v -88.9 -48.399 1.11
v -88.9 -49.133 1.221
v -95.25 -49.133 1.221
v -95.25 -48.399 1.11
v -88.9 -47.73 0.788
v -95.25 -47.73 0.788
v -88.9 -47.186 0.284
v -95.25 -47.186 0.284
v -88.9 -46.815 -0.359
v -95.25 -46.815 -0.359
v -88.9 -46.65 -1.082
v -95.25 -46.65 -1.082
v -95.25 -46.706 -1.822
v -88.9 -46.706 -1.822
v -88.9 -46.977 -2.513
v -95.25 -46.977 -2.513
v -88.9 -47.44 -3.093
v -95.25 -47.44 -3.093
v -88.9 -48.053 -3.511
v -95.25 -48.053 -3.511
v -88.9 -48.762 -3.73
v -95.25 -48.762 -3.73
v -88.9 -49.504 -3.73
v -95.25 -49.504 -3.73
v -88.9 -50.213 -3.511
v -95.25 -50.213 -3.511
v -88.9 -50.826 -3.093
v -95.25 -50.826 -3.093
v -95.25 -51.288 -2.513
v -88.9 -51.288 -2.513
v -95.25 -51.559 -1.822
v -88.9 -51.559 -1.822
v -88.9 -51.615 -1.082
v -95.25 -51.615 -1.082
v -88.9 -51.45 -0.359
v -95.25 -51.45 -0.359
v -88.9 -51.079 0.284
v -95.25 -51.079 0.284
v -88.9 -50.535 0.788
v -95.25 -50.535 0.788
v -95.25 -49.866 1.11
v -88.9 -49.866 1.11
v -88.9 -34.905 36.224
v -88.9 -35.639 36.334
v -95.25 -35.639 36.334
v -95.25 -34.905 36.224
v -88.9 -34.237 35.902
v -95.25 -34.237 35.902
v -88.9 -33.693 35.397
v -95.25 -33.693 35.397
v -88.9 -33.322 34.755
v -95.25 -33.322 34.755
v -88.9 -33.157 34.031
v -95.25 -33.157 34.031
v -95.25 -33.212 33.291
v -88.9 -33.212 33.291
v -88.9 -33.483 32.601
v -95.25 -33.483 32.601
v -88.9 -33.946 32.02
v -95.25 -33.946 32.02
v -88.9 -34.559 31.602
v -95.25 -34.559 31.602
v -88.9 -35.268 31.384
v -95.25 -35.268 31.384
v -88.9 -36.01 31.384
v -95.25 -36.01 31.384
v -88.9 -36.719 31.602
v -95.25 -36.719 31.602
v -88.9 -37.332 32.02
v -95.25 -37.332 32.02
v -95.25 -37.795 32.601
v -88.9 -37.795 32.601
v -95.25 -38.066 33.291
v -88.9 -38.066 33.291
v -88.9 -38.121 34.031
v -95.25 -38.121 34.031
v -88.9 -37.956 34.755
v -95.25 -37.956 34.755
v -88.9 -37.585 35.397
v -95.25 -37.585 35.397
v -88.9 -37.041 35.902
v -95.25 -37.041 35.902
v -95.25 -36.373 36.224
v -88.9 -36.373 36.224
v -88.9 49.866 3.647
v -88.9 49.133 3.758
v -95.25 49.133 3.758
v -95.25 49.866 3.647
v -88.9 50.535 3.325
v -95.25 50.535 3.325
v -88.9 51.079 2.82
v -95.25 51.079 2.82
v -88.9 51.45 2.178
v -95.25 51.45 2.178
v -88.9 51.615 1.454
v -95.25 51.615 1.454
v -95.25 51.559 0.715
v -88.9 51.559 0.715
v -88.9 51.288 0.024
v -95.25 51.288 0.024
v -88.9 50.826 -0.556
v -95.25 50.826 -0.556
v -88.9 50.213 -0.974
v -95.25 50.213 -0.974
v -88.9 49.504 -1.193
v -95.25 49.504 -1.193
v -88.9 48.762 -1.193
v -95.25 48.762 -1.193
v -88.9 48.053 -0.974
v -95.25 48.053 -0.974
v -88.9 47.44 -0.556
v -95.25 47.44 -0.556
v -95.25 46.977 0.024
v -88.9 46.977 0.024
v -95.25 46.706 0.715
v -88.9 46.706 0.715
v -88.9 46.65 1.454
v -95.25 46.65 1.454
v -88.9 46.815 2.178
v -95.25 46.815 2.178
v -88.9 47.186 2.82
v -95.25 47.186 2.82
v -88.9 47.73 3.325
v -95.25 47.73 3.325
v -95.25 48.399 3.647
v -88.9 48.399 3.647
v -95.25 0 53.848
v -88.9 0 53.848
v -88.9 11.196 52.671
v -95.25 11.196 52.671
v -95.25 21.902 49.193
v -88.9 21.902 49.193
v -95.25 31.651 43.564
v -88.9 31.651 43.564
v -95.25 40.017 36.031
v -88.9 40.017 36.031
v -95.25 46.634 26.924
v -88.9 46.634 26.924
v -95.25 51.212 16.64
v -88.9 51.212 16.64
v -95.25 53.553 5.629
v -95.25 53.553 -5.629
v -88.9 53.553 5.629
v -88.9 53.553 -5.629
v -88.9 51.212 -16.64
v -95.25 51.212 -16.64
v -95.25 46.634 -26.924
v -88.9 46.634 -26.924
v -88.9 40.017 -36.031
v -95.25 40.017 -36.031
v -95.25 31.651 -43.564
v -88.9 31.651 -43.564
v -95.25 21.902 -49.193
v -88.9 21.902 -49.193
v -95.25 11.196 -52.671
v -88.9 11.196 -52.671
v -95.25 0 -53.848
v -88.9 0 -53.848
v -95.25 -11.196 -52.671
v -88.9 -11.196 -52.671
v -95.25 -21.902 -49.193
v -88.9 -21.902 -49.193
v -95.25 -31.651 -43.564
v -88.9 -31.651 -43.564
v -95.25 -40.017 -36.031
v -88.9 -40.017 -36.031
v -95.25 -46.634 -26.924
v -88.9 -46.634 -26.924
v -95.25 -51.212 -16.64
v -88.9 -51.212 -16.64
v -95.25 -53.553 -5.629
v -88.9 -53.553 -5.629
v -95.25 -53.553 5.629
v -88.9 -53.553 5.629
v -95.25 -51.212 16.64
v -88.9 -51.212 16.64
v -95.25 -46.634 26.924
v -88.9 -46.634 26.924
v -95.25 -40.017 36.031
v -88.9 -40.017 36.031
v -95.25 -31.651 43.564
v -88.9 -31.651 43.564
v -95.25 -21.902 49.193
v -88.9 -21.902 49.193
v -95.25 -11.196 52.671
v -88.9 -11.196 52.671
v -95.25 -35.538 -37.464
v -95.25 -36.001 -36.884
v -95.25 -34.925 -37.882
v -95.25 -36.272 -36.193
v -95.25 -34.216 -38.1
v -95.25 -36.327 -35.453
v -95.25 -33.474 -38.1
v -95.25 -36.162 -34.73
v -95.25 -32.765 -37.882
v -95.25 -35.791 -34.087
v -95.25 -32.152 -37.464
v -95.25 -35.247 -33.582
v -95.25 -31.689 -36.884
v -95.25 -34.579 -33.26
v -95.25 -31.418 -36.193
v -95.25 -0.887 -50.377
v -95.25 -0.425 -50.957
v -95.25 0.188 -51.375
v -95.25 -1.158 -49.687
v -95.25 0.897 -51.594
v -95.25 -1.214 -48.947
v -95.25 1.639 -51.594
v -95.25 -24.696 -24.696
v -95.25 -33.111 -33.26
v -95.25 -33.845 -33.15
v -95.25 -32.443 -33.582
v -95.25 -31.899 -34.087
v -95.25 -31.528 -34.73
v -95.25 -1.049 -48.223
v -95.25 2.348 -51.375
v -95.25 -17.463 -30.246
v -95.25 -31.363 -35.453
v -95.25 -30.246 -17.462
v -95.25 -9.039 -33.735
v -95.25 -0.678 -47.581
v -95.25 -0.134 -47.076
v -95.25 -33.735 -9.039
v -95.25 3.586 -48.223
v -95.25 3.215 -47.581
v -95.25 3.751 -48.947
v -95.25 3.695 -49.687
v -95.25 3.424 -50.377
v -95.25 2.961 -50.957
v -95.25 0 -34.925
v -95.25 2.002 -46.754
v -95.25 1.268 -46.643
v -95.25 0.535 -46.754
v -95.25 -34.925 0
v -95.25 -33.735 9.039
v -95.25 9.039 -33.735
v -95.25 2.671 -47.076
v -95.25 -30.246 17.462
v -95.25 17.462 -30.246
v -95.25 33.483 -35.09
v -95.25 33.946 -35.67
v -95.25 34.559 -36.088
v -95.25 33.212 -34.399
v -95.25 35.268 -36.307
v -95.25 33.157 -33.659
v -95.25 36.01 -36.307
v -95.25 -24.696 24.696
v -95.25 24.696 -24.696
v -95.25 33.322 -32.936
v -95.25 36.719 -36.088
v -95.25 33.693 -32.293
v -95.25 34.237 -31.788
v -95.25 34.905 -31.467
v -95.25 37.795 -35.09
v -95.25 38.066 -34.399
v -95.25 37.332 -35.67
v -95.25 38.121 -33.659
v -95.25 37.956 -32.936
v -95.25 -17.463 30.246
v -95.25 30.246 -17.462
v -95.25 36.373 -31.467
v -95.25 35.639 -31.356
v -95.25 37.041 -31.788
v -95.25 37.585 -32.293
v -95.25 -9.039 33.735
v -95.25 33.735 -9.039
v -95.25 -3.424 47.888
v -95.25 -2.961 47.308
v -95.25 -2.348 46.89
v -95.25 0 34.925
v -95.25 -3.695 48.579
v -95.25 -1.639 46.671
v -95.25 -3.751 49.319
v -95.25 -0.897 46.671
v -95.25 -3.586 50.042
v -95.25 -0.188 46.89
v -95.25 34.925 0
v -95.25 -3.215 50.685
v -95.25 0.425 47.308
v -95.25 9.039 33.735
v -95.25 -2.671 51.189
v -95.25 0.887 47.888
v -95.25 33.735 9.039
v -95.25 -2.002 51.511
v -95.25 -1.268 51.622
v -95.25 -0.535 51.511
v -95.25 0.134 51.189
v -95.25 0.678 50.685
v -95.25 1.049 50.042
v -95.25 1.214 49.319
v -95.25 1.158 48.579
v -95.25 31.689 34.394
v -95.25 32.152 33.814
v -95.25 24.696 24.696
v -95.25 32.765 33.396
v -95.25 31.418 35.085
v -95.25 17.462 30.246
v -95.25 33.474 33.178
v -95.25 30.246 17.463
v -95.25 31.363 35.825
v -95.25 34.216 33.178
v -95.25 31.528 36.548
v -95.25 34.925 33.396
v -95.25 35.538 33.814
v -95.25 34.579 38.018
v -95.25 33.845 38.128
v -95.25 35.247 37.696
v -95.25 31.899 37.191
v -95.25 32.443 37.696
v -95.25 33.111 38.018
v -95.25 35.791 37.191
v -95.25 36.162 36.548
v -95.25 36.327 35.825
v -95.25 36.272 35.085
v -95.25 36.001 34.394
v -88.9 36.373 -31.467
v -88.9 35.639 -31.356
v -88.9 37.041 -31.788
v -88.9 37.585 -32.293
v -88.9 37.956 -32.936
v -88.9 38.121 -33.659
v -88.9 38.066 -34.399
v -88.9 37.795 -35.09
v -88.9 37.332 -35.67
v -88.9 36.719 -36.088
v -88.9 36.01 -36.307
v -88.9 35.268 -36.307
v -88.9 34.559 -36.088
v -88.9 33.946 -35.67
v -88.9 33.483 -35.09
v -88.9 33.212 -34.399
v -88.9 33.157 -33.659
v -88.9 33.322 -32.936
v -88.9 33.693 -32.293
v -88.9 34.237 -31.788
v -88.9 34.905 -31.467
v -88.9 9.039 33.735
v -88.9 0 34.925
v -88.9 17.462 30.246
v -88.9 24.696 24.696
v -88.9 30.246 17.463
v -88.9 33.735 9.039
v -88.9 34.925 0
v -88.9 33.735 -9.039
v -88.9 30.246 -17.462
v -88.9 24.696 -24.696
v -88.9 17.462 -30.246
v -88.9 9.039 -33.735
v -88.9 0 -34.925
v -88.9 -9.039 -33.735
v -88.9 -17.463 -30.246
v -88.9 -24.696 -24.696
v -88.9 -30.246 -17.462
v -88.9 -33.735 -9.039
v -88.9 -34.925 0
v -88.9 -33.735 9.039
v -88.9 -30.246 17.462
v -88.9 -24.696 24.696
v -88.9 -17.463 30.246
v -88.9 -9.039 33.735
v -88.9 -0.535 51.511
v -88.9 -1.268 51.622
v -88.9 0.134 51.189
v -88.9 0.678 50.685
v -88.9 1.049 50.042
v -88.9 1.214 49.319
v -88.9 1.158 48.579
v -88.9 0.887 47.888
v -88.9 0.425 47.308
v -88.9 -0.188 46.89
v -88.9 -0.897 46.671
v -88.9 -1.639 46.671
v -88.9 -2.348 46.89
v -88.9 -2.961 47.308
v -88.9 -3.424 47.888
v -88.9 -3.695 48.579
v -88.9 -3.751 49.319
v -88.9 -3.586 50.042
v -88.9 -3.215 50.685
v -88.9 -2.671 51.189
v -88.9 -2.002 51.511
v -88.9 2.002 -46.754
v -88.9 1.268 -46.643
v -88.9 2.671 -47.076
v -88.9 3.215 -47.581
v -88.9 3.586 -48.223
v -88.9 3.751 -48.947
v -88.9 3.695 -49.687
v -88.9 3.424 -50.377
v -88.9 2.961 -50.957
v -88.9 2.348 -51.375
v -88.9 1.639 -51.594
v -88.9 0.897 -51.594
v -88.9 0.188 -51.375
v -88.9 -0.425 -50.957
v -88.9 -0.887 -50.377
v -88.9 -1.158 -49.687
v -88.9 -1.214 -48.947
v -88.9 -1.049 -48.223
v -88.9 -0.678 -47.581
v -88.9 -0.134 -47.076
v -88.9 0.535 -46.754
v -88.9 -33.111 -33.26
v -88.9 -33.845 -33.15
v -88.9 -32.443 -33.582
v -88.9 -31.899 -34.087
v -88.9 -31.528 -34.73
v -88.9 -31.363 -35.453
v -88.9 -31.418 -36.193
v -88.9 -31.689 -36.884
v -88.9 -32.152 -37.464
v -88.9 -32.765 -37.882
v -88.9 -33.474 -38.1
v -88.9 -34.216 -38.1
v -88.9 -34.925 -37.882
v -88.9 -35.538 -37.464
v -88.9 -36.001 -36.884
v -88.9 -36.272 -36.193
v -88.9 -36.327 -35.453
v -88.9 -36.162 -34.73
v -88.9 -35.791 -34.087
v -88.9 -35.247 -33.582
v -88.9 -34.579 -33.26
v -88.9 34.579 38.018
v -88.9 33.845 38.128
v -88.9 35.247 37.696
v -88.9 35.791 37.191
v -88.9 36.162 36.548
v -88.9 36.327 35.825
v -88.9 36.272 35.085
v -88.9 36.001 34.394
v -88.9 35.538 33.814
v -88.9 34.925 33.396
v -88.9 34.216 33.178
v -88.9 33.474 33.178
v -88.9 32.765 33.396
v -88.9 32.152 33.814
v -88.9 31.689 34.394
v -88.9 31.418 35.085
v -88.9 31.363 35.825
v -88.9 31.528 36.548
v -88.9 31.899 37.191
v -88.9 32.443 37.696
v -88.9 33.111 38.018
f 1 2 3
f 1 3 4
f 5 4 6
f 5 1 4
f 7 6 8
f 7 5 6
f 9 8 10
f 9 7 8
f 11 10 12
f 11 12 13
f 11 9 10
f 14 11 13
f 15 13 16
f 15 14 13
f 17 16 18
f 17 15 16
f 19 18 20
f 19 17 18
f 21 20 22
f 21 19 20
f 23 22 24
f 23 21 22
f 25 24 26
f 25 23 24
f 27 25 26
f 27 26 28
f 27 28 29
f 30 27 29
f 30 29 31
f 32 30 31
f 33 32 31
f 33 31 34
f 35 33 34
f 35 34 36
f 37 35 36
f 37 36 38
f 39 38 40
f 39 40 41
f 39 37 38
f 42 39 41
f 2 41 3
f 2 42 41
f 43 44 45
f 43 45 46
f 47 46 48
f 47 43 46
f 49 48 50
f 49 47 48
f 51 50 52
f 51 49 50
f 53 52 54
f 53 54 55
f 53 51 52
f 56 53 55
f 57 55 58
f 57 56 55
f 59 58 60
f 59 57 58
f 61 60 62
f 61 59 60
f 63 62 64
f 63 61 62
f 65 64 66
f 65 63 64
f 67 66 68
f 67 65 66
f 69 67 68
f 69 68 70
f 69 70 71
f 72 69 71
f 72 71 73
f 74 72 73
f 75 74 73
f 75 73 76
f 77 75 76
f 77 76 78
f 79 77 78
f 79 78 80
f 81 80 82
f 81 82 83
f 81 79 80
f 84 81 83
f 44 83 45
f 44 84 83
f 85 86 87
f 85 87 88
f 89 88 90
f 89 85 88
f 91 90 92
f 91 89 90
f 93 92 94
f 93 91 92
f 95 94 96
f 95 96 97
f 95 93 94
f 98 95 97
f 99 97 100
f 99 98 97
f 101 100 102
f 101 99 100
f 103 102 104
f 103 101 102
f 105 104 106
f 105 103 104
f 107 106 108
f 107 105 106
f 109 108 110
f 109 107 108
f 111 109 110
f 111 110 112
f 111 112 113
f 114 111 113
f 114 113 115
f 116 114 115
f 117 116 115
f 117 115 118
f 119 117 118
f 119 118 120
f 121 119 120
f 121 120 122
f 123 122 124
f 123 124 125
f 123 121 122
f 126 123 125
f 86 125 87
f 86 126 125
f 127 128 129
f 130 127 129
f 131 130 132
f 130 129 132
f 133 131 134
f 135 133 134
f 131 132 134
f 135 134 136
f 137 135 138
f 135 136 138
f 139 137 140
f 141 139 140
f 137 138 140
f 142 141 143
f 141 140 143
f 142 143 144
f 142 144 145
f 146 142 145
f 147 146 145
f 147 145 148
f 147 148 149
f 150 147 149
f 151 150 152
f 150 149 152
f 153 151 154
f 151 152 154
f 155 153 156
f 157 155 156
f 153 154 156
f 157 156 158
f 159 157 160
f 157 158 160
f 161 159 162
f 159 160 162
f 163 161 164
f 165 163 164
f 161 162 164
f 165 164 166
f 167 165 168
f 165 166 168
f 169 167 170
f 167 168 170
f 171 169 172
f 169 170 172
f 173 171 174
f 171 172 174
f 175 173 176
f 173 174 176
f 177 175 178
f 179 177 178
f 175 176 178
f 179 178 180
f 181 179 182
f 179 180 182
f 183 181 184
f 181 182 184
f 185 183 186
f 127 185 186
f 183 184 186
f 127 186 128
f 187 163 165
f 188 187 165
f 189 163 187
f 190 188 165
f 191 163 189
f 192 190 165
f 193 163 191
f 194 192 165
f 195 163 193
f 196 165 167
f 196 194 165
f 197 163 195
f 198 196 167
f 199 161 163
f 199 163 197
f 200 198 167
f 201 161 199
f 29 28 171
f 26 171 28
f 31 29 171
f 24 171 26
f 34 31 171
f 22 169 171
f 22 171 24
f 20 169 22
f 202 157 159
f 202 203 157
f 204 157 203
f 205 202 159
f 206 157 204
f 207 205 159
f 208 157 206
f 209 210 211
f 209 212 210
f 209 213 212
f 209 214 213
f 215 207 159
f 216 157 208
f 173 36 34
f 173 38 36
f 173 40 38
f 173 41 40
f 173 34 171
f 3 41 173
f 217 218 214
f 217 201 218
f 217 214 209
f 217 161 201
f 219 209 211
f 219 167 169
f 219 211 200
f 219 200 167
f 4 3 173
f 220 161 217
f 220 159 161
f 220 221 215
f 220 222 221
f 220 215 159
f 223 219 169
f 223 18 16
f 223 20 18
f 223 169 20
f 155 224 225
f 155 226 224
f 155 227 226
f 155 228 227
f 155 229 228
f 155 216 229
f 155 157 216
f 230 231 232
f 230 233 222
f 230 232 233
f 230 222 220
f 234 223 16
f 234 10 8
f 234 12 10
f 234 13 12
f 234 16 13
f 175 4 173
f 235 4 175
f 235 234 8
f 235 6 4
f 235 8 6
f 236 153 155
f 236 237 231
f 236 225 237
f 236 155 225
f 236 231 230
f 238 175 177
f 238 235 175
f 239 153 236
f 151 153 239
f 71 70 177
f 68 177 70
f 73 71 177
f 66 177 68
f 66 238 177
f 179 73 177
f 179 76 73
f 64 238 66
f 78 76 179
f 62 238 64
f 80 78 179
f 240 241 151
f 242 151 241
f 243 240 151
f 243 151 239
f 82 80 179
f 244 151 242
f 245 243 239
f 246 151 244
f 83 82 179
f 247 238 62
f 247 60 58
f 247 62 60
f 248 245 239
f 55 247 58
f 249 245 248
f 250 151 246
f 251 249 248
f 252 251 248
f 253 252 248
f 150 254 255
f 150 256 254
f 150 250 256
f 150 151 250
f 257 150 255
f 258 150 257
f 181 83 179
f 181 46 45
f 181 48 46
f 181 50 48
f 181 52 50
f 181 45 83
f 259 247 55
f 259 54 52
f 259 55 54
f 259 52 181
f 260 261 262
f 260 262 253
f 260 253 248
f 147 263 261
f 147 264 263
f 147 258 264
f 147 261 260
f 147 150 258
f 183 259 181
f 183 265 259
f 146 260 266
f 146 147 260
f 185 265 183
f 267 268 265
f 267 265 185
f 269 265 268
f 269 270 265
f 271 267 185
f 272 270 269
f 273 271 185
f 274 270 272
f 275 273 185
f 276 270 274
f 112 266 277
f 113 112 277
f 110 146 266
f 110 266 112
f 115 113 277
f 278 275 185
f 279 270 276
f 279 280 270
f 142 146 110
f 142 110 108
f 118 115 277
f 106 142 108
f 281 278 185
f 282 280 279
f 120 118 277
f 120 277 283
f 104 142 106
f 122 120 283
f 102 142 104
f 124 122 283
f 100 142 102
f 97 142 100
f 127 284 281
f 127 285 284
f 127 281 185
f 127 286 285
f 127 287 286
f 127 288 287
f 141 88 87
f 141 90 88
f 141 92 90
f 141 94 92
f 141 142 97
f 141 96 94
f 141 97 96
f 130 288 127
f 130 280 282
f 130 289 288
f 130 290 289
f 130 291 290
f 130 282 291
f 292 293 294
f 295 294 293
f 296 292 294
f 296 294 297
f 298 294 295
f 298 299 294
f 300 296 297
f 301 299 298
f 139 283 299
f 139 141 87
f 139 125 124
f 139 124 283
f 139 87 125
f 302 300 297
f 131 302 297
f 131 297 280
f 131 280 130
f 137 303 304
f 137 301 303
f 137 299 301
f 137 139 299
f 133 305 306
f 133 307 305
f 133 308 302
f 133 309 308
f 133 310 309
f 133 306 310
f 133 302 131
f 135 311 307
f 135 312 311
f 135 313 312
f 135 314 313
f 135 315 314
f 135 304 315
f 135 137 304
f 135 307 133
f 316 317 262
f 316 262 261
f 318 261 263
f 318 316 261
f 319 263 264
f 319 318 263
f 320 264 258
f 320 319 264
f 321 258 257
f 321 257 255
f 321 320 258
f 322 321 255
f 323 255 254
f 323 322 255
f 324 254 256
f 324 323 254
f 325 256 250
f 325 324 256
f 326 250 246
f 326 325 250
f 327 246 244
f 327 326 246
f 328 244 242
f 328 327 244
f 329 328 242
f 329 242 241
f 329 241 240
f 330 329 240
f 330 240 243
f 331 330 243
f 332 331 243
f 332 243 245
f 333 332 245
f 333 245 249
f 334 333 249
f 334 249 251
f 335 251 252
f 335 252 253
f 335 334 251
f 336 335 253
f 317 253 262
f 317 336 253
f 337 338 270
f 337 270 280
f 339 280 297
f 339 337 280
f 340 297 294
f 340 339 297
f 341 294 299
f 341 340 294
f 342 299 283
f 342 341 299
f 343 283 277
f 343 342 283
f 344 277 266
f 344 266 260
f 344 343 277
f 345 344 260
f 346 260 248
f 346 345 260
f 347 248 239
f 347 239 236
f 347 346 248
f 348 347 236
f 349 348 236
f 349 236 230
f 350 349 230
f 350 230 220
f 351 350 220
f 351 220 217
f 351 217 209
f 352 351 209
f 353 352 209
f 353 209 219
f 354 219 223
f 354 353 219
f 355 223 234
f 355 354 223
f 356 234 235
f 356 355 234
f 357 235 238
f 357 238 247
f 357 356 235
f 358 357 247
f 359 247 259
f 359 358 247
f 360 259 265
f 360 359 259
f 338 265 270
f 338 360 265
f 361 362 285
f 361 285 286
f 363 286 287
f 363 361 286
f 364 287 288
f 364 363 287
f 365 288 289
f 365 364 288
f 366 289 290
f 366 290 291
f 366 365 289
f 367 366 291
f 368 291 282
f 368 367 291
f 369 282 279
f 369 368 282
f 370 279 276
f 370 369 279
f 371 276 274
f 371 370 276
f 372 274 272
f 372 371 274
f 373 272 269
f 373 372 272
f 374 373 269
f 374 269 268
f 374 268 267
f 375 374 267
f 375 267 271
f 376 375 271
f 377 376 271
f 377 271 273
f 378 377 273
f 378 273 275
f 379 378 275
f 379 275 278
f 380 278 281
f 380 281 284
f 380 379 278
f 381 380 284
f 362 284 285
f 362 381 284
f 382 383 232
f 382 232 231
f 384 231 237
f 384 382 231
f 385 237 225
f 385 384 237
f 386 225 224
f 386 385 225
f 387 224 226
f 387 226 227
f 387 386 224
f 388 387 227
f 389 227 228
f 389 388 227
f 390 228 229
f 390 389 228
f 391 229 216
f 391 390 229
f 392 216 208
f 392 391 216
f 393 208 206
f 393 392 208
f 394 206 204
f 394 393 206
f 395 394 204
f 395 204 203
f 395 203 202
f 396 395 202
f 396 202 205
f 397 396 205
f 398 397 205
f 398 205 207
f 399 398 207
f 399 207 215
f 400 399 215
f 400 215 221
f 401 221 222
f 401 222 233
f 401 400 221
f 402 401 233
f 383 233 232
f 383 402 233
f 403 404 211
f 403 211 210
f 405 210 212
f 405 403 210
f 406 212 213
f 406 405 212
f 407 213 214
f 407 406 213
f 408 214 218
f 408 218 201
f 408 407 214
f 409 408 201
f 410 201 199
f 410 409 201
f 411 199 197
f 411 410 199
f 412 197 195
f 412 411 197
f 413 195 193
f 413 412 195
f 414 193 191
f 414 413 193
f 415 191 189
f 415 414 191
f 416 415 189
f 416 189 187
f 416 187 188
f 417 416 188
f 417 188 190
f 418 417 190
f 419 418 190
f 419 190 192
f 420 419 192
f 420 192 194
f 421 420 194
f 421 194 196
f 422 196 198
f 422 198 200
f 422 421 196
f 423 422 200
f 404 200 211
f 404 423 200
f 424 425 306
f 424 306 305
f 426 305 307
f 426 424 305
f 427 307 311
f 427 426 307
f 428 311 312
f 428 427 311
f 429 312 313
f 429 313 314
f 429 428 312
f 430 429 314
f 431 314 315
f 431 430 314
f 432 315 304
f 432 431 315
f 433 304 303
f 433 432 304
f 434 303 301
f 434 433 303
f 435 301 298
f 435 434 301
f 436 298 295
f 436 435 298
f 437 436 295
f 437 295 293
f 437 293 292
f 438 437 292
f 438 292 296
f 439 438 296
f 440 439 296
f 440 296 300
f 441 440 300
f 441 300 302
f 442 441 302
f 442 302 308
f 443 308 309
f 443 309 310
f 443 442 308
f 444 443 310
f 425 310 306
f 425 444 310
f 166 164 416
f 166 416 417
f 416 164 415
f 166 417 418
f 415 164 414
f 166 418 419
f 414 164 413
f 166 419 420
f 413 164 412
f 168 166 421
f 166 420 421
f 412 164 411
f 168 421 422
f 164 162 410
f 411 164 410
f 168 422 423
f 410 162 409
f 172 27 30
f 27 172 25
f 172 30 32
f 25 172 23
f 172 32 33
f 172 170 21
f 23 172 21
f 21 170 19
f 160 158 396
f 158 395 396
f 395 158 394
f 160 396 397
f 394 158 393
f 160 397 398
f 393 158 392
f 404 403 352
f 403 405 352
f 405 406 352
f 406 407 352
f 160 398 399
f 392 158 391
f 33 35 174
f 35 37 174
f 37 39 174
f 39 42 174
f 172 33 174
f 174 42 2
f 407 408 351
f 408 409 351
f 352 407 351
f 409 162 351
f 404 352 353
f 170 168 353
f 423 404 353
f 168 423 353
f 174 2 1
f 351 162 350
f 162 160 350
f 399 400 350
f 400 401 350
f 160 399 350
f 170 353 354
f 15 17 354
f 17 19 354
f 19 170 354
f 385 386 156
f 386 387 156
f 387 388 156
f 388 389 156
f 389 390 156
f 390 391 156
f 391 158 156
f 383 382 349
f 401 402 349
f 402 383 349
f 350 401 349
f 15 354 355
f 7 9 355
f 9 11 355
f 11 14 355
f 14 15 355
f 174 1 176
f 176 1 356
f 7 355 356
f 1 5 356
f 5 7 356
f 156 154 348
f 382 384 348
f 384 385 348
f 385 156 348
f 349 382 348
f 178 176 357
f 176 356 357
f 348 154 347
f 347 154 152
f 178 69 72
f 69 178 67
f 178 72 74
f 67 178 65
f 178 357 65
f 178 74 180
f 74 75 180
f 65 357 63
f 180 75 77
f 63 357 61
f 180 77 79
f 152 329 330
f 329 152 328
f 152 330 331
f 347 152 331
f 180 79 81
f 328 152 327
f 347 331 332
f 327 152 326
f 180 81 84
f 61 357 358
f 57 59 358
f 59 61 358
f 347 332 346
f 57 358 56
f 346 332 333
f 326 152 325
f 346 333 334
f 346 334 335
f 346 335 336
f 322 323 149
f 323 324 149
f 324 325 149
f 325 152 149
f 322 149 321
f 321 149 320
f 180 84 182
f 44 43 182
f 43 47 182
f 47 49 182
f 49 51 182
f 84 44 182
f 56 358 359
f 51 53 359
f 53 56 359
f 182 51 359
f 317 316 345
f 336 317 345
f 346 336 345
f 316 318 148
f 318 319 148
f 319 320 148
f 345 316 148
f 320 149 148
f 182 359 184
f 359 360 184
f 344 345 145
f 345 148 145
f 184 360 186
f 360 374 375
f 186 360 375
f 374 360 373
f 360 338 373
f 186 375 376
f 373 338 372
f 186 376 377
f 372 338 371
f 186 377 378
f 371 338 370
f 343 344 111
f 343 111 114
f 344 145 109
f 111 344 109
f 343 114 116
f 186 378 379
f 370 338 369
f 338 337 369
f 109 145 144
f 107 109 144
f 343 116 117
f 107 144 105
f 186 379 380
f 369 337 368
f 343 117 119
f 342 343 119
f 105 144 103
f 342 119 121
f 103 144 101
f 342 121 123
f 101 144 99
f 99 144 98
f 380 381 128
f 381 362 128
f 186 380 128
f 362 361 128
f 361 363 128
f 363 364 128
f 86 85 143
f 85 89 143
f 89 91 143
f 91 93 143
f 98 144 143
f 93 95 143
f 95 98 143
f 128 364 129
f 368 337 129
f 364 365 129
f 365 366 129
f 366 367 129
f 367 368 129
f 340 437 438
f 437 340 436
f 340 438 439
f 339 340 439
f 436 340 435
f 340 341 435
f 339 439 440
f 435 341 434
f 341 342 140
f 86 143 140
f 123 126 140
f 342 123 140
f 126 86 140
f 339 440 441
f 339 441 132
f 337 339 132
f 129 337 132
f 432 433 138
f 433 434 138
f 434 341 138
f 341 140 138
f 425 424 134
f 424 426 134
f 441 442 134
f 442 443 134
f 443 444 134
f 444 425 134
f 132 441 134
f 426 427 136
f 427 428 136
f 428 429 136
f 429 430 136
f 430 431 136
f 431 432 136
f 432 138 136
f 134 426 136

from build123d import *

# Parameters (mm, degrees)
SKETCH1_R           = 53.848
SKETCH1_R_2         = 34.925
SKETCH1_R_3         = 2.4892
BOSS_EXTRUDE1_DEPTH = 6.35


with BuildPart() as part:
    # Sketch1 → Boss-Extrude1 (new body)
    with BuildSketch(Plane.ZY.offset(88.9)):
        Circle(SKETCH1_R)
        Circle(SKETCH1_R_2, mode=Mode.SUBTRACT)
        with Locations((-33.845113149, 35.638918571)):
            Circle(SKETCH1_R_3, mode=Mode.SUBTRACT)
        with Locations((1.268411978, 49.132630014)):
            Circle(SKETCH1_R_3, mode=Mode.SUBTRACT)
        with Locations((35.638918571, 33.845113149)):
            Circle(SKETCH1_R_3, mode=Mode.SUBTRACT)
        with Locations((49.132630014, -1.268411978)):
            Circle(SKETCH1_R_3, mode=Mode.SUBTRACT)
        with Locations((33.845113149, -35.638918571)):
            Circle(SKETCH1_R_3, mode=Mode.SUBTRACT)
        with Locations((-1.268411978, -49.132630014)):
            Circle(SKETCH1_R_3, mode=Mode.SUBTRACT)
        with Locations((-35.638918571, -33.845113149)):
            Circle(SKETCH1_R_3, mode=Mode.SUBTRACT)
        with Locations((-49.132630014, 1.268411978)):
            Circle(SKETCH1_R_3, mode=Mode.SUBTRACT)
    extrude(amount=BOSS_EXTRUDE1_DEPTH)


solid = part.part
